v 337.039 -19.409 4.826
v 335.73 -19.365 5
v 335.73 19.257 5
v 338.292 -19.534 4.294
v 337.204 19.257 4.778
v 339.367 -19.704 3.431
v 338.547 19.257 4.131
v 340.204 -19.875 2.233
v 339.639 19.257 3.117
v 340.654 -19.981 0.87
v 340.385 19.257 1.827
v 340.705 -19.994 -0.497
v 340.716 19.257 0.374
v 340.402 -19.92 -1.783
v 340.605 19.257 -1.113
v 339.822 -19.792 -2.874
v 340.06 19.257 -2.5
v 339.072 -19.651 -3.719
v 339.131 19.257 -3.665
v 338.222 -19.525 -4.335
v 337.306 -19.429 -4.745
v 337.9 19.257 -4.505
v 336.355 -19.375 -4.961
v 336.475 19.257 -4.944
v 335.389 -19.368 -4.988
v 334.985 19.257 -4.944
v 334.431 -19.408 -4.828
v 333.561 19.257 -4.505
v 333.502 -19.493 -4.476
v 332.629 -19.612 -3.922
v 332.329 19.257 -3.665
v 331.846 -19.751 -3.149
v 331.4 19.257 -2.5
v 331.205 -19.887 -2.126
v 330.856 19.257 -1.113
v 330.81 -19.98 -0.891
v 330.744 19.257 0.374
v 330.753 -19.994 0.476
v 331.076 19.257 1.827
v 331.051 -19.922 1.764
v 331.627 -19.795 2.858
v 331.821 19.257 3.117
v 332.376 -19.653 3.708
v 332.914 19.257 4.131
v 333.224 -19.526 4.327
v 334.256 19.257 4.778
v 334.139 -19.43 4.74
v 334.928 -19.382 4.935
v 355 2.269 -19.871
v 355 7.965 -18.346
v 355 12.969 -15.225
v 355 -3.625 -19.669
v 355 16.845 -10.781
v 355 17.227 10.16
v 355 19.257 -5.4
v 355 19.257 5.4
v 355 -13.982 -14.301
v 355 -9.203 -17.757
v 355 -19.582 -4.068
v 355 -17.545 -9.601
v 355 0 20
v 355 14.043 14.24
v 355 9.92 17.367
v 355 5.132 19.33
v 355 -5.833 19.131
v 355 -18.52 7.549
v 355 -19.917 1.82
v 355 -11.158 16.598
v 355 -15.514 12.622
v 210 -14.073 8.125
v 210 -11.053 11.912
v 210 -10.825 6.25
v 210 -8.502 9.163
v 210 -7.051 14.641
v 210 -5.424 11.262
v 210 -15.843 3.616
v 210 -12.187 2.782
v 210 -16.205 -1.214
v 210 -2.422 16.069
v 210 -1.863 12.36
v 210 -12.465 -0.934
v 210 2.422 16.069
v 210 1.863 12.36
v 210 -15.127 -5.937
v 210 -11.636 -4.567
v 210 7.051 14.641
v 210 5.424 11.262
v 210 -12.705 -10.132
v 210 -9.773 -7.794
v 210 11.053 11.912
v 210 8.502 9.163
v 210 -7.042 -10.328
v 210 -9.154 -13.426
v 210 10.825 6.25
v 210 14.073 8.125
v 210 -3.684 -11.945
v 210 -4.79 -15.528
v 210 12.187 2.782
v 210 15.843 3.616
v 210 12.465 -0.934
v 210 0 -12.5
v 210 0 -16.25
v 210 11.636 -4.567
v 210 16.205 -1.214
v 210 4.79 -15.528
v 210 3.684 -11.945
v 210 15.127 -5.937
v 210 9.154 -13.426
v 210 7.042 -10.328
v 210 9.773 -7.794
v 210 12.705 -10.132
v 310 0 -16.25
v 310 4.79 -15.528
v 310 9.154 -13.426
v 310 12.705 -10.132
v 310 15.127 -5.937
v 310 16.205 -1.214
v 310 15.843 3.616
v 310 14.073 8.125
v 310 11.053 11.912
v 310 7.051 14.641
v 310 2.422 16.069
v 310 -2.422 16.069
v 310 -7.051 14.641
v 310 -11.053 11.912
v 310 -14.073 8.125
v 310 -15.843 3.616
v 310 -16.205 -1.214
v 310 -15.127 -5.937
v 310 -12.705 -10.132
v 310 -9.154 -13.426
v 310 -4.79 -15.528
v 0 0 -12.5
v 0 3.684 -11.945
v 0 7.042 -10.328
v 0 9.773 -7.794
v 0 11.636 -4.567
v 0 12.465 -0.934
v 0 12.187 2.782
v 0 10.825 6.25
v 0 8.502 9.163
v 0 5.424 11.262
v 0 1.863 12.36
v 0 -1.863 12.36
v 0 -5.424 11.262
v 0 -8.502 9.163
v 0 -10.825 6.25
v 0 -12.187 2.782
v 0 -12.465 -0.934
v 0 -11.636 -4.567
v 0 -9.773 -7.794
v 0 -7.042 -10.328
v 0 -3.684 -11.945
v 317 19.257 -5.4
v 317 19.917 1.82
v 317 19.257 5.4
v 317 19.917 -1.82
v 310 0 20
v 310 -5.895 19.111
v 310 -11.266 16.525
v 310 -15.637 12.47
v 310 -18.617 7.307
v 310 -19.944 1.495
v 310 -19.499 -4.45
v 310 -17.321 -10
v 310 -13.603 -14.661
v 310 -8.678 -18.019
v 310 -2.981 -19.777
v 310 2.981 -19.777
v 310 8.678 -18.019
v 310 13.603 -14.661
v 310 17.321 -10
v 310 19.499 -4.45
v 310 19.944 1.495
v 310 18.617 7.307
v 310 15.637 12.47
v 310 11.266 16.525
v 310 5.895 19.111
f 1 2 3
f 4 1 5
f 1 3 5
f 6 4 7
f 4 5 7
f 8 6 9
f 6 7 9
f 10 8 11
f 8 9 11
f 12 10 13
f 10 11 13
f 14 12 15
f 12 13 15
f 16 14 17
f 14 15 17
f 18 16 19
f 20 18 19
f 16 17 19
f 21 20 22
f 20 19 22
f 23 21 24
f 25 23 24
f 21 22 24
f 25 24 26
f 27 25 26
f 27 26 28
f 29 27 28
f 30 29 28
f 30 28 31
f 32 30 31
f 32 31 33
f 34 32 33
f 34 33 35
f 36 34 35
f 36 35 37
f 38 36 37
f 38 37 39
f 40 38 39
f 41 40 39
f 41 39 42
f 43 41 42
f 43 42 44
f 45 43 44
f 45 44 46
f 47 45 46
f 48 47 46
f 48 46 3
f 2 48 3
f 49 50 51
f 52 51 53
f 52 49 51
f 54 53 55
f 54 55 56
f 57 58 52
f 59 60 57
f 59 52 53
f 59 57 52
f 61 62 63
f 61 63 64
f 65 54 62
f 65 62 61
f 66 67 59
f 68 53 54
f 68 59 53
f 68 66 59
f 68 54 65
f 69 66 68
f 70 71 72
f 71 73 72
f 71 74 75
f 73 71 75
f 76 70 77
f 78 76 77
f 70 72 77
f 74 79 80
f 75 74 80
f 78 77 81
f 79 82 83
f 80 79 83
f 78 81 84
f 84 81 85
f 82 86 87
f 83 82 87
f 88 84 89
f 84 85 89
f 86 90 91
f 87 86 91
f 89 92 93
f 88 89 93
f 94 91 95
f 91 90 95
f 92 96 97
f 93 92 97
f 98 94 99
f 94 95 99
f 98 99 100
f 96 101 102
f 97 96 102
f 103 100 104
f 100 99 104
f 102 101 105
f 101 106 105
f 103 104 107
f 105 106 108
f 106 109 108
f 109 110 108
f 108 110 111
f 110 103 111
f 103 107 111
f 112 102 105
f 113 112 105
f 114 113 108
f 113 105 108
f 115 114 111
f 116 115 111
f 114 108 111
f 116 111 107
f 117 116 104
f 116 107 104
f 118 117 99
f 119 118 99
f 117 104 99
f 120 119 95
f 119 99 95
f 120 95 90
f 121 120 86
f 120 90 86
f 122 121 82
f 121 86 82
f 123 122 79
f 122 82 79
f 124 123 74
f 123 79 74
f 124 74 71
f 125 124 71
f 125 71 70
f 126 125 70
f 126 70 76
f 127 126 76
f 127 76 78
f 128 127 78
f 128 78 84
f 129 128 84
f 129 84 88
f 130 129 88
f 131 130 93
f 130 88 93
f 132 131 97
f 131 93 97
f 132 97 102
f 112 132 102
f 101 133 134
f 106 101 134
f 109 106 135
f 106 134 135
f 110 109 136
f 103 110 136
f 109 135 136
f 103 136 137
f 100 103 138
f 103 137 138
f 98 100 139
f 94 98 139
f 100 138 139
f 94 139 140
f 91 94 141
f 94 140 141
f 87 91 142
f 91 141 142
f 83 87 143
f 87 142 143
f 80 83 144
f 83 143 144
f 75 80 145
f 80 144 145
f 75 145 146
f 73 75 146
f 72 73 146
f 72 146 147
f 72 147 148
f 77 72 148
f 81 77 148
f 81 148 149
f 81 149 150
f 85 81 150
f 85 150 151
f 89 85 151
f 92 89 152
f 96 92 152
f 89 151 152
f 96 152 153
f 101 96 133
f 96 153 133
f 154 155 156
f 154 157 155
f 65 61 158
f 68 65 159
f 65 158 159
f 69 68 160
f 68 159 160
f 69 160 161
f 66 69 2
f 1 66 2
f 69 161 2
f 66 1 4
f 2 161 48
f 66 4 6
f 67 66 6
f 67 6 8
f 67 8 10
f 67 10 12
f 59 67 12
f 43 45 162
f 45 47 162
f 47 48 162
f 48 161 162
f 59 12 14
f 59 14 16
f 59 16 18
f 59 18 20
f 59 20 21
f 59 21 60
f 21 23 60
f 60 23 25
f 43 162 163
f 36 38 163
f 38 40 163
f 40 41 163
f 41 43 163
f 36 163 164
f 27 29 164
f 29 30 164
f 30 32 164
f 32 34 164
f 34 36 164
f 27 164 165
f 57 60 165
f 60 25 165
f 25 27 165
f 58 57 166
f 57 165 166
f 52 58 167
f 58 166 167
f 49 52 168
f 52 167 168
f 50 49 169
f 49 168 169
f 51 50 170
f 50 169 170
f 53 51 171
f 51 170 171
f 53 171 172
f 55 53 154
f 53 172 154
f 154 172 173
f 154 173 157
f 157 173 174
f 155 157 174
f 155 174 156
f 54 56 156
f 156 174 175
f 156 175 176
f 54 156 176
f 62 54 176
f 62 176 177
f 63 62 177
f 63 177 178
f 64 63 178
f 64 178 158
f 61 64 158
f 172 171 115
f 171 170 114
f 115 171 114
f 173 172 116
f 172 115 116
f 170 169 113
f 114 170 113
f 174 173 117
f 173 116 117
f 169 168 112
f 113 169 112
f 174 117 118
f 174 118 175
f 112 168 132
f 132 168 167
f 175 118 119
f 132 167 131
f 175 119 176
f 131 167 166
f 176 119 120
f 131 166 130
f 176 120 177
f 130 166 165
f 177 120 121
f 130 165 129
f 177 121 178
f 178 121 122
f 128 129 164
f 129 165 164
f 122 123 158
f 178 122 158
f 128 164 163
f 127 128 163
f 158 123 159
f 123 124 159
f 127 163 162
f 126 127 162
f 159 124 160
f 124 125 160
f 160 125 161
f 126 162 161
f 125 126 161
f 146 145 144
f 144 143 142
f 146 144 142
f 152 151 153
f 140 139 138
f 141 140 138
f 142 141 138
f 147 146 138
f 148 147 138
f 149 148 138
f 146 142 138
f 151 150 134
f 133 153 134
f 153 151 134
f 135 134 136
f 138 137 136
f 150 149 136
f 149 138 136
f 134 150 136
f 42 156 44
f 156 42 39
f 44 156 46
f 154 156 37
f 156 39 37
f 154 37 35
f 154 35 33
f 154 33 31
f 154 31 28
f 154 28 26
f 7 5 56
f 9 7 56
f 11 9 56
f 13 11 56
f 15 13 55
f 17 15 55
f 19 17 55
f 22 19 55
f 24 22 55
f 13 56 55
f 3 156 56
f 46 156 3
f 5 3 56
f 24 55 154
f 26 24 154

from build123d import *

# Parameters (mm, degrees)
CROQUIS2_R                 = 12.5
SALIENTE_EXTRUIR1_DEPTH    = 210
CROQUIS4_R                 = 16.25
SALIENTE_EXTRUIR2_DEPTH    = 100
CROQUIS5_R                 = 20
SALIENTE_EXTRUIR3_DEPTH    = 45
CROQUIS6_W                 = 10.799694728
CROQUIS6_H                 = 1.485501512
CORTAR_EXTRUIR1_DEPTH      = 38
CORTAR_EXTRUIR2_REACH      = 359.724
CORTAR_EXTRUIR2_END_RADIUS = 20
CROQUIS8_R                 = 5


with BuildPart() as part:
    # Croquis2 → Saliente-Extruir1 (new body)
    with BuildSketch(Plane(origin=(0, 0, 0), x_dir=(0, 0, -1), z_dir=(1, 0, 0))):
        Circle(CROQUIS2_R)
    extrude(amount=SALIENTE_EXTRUIR1_DEPTH)

    # Croquis4 → Saliente-Extruir2 (add)
    with BuildSketch(Plane(origin=(210, 0, 0), x_dir=(0, 0, -1), z_dir=(1, 0, 0))):
        Circle(CROQUIS4_R)
    extrude(amount=SALIENTE_EXTRUIR2_DEPTH)

    # Croquis5 → Saliente-Extruir3 (add)
    with BuildSketch(Plane(origin=(310, 0, 0), x_dir=(0, 0, -1), z_dir=(1, 0, 0))):
        with Locations(Location((0, 0, 0), (0, 0, 180))):
            Circle(CROQUIS5_R)
    extrude(amount=SALIENTE_EXTRUIR3_DEPTH)

    # Croquis6 → Cortar-Extruir1 (cut)
    with BuildSketch(Plane(origin=(355, 0, 0), x_dir=(0, 0, -1), z_dir=(1, 0, 0))):
        with Locations((0, 20)):
            Rectangle(CROQUIS6_W, CROQUIS6_H)
    extrude(amount=-CORTAR_EXTRUIR1_DEPTH, mode=Mode.SUBTRACT)

    # Cortar-Extruir2: up to this cylinder (the profile starts inside it)
    cortar_extruir2_end = Plane(origin=(335.730152, 0, 0), z_dir=(-1, 0, 0)) * Cylinder(CORTAR_EXTRUIR2_END_RADIUS, 760.448, mode=Mode.PRIVATE)
    # Croquis8 → Cortar-Extruir2 (cut, up to the surface)
    with BuildSketch(Plane(origin=(0, 19.257249244, 0), x_dir=(1, 0, 0), z_dir=(0, 1, 0)), mode=Mode.PRIVATE) as cortar_extruir2_sk1:
        with Locations(Location((335.730152453, 0, 0), (0, 0, 270))):
            Circle(CROQUIS8_R)
    cortar_extruir2_tool1 = extrude(cortar_extruir2_sk1.sketch, amount=-CORTAR_EXTRUIR2_REACH, mode=Mode.PRIVATE) & cortar_extruir2_end
    add(cortar_extruir2_tool1.solids().sort_by_distance((335.730152, 19.257249, 0))[0], mode=Mode.SUBTRACT)


solid = part.part
